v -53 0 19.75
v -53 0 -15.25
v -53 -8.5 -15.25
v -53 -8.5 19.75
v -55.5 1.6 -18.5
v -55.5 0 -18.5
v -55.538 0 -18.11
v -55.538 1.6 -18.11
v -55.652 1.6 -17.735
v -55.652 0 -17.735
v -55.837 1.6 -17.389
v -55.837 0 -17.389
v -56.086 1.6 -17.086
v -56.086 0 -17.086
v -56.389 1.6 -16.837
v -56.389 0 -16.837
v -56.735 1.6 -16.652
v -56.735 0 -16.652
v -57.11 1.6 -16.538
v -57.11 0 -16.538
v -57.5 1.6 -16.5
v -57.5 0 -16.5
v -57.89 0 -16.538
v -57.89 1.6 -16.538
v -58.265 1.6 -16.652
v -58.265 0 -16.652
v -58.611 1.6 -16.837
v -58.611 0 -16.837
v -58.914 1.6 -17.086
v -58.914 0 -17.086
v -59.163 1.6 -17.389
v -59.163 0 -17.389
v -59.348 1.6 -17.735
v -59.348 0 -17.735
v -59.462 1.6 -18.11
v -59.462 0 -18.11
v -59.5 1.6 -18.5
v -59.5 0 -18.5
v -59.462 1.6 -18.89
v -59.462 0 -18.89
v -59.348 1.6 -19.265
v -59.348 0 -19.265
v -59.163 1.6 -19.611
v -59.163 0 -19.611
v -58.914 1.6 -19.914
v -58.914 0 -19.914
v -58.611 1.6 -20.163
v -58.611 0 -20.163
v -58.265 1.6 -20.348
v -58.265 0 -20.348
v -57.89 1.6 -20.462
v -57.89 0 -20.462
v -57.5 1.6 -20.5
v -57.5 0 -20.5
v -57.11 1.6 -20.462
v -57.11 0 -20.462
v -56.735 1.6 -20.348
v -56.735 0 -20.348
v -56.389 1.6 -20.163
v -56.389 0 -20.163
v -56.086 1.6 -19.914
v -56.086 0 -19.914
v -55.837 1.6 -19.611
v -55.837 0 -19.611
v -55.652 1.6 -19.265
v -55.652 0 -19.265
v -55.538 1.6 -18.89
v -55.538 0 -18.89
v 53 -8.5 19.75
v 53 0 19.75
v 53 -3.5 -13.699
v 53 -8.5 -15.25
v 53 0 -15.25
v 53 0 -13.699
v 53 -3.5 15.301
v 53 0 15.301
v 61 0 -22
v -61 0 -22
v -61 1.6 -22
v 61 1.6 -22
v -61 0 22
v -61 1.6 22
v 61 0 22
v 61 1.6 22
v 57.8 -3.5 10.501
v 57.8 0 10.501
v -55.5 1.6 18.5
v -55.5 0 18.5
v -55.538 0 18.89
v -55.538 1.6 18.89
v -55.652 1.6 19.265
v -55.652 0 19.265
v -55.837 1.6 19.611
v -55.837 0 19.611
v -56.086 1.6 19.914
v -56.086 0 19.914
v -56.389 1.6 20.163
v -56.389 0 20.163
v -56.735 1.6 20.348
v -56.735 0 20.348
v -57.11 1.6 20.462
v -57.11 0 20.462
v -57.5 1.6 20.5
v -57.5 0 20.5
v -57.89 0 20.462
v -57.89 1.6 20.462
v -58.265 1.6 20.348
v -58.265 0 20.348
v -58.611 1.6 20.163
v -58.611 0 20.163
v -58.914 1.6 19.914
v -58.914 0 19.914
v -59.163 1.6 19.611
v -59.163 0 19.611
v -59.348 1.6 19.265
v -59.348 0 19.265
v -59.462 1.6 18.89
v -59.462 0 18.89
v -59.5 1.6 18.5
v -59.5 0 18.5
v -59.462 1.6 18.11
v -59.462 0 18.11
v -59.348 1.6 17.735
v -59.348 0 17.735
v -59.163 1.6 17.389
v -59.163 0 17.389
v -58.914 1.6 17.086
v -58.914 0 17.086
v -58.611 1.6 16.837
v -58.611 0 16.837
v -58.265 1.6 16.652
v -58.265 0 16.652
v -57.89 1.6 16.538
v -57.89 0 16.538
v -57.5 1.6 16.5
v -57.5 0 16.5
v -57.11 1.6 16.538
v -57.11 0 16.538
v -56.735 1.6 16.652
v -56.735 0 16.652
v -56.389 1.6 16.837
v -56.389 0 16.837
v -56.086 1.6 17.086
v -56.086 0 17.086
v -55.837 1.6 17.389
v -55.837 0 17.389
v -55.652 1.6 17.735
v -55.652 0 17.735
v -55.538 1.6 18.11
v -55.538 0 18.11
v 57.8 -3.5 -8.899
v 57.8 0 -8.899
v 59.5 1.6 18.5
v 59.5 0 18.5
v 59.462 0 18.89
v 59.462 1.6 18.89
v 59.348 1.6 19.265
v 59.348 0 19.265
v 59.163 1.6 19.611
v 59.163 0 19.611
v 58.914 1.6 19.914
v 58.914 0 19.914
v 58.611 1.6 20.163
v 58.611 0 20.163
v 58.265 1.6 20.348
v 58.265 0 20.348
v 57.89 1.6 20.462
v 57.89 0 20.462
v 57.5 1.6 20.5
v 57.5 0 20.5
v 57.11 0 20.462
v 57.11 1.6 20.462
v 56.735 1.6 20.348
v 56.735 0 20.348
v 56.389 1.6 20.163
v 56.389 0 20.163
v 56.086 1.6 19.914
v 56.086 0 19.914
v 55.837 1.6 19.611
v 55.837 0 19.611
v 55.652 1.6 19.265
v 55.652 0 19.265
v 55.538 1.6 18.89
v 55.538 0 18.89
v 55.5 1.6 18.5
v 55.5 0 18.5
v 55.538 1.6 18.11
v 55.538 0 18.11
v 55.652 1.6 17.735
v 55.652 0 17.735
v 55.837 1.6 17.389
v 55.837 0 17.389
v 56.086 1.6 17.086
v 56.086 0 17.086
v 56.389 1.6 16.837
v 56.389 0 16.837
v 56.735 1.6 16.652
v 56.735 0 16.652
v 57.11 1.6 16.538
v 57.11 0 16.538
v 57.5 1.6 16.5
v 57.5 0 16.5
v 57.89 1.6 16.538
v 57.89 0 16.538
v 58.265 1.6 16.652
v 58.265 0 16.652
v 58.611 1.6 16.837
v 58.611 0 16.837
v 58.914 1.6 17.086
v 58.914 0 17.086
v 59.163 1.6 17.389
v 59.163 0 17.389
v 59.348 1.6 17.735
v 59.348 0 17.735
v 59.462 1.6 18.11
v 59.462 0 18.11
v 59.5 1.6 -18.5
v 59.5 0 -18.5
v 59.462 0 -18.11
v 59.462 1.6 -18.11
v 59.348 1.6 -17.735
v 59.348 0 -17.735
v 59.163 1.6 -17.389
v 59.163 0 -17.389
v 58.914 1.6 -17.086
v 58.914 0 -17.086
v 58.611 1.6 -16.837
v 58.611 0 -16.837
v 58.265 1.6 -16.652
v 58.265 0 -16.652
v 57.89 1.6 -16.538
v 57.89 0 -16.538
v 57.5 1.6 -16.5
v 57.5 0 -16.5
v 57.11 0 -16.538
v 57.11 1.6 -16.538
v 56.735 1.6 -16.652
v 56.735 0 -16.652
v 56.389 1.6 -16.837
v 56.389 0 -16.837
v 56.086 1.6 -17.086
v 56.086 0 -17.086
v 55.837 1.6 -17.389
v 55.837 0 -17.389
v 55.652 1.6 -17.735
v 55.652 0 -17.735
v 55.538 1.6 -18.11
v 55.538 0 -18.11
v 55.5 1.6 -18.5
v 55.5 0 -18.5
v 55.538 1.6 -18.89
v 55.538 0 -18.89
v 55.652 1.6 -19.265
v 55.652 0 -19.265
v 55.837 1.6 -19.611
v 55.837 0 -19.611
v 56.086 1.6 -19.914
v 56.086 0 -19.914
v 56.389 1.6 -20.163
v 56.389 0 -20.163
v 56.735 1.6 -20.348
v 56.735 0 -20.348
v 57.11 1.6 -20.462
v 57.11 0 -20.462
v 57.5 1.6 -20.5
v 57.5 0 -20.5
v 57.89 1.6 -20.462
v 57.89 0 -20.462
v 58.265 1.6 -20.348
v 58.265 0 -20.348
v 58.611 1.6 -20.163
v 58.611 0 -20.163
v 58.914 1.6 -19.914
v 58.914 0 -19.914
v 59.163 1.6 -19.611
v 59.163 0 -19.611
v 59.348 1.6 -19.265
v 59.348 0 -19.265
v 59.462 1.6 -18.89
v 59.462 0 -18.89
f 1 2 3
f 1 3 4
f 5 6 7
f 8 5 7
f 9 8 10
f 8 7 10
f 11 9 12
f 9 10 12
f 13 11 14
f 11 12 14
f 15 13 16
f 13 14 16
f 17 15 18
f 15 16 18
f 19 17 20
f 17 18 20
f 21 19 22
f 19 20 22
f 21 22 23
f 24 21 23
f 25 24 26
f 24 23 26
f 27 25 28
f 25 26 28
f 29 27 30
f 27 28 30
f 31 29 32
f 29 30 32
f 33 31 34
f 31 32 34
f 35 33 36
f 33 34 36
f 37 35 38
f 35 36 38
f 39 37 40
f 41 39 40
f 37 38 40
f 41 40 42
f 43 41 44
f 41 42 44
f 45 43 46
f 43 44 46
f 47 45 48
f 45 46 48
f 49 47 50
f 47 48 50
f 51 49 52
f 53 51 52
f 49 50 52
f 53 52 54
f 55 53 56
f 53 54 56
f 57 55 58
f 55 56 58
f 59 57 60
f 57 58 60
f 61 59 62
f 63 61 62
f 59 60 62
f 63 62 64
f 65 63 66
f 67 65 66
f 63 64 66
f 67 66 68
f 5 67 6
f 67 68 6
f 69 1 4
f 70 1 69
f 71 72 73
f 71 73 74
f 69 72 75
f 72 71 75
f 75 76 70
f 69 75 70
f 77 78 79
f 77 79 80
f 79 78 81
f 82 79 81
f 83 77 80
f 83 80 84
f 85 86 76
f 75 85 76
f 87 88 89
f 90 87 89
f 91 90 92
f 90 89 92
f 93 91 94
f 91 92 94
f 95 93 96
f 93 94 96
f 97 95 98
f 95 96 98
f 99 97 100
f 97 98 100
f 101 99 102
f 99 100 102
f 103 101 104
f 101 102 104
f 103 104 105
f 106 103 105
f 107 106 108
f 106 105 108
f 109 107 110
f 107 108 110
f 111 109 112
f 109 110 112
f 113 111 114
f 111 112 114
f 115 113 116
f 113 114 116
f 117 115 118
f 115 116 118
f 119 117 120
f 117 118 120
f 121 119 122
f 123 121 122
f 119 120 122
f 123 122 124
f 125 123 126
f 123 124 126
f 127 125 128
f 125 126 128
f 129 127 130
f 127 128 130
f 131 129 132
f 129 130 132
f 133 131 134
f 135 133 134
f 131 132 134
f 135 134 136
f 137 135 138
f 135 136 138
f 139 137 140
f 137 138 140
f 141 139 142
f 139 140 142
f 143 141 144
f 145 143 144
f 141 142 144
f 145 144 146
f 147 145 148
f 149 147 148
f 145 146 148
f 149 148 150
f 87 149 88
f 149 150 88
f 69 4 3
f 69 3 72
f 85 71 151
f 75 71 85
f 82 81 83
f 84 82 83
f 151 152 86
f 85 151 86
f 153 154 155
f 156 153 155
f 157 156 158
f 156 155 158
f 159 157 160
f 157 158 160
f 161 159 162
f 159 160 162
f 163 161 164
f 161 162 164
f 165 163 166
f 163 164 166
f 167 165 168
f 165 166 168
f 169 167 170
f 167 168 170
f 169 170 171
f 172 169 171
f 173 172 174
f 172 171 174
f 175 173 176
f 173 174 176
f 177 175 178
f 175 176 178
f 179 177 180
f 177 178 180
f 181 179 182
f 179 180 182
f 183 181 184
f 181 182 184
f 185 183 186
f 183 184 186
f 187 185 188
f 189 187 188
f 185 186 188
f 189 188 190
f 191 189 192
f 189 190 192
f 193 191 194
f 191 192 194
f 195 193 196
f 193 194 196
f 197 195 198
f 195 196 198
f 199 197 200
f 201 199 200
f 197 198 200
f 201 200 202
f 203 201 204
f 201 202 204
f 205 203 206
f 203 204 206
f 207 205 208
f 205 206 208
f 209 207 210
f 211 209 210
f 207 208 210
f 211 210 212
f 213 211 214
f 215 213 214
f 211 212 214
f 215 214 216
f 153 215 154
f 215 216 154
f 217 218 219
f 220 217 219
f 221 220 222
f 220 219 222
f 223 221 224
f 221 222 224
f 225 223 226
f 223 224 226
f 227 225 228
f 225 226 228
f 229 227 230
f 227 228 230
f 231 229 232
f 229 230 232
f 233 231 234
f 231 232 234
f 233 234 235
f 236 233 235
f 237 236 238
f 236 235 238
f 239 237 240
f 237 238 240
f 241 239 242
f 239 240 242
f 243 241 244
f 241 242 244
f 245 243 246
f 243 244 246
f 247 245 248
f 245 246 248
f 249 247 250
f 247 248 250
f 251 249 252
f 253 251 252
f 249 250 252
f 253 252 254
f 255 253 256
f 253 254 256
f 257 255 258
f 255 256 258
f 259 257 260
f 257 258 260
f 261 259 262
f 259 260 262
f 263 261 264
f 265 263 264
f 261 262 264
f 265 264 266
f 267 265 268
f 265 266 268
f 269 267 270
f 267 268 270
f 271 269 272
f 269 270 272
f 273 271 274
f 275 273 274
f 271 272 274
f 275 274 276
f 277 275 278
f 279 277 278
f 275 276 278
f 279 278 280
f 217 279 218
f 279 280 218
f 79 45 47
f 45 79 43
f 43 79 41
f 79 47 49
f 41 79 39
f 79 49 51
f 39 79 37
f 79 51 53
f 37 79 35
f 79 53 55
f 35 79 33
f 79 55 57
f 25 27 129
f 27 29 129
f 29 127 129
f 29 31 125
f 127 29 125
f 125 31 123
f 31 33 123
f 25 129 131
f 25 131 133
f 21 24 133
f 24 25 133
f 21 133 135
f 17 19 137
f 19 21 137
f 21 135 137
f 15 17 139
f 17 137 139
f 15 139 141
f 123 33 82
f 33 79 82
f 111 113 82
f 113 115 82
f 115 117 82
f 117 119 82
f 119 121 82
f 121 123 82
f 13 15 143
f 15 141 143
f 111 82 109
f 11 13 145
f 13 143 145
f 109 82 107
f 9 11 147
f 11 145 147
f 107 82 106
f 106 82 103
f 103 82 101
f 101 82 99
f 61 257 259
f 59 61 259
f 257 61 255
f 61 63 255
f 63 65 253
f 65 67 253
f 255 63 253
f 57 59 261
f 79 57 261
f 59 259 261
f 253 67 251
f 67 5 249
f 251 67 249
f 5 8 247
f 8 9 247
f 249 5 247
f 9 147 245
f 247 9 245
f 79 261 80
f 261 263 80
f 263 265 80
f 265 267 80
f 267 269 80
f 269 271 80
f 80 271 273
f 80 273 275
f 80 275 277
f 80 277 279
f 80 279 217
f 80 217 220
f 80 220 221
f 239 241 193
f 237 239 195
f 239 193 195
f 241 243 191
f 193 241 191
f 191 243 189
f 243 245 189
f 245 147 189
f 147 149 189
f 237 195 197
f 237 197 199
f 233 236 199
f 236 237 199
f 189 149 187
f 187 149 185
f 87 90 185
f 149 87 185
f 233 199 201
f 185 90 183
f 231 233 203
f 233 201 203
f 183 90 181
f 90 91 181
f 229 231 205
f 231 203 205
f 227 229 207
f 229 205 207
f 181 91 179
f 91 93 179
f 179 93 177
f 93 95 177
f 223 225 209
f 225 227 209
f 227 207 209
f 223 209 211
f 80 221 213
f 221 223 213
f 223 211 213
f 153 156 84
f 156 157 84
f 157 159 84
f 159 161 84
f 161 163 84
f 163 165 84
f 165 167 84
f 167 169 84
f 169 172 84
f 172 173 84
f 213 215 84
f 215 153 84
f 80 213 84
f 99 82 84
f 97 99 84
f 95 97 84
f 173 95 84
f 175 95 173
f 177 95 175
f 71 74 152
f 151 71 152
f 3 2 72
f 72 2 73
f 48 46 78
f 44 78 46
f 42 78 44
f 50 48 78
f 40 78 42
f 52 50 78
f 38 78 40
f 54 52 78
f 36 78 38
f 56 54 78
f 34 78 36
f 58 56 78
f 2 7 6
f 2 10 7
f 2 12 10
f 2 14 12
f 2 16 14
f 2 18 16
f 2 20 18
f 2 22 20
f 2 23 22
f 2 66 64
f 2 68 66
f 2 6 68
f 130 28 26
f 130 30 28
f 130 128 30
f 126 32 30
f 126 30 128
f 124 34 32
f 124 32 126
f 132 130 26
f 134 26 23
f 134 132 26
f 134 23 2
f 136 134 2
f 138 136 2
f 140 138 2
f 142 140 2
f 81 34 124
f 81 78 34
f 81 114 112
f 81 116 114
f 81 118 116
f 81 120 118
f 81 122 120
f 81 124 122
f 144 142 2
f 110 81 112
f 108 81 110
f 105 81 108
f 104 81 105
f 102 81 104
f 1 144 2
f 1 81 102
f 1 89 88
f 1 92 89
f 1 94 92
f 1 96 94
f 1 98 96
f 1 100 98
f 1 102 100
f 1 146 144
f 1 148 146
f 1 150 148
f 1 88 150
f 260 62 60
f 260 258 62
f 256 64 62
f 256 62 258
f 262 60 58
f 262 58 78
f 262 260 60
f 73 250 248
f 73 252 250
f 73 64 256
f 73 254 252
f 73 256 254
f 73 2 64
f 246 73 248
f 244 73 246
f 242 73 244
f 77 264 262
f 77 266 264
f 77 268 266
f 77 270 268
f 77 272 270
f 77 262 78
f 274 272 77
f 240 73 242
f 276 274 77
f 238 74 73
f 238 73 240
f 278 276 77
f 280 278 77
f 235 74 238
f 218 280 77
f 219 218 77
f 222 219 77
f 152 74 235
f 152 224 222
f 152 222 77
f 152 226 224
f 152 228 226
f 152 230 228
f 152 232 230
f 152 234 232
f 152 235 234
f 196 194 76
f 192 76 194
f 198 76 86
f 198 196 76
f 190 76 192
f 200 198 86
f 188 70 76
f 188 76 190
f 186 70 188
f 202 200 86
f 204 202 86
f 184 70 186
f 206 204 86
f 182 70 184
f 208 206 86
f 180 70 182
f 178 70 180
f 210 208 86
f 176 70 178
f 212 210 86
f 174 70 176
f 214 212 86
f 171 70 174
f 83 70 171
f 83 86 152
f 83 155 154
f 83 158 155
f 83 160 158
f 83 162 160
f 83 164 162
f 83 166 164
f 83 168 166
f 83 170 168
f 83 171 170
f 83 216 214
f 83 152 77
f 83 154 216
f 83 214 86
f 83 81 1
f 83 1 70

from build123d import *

# Parameters (mm, degrees)
F0_W     = 122
F0_H     = 44
F0_R     = 2
F1_DEPTH = 1.6
F2_W     = 106
F2_H     = 35
F3_DEPTH = 8.5
F5_DEPTH = 3.5


with BuildPart() as f1:
    # F0 (on Front) → F1 (new body)
    with BuildSketch(Plane.XZ):
        Rectangle(F0_W, F0_H)
        with Locations((-57.5, -18.5)):
            Circle(F0_R, mode=Mode.SUBTRACT)
        with Locations((57.5, -18.5)):
            Circle(F0_R, mode=Mode.SUBTRACT)
        with Locations((-57.5, 18.5)):
            Circle(F0_R, mode=Mode.SUBTRACT)
        with Locations((57.5, 18.5)):
            Circle(F0_R, mode=Mode.SUBTRACT)
    extrude(amount=-F1_DEPTH)

    # F2 (on Front) → F3 (join)
    with BuildSketch(Plane.XZ):
        with Locations((0, 2.25)):
            Rectangle(F2_W, F2_H)
    extrude(amount=F3_DEPTH)

    # F4 (on Front) → F5 (join)
    with BuildSketch(Plane.XZ):
        Polygon((53, 15.300509), (53, -13.699491), (57.8, -8.899491), (57.8, 10.500509), align=None)
    extrude(amount=F5_DEPTH)


solid = f1.part
